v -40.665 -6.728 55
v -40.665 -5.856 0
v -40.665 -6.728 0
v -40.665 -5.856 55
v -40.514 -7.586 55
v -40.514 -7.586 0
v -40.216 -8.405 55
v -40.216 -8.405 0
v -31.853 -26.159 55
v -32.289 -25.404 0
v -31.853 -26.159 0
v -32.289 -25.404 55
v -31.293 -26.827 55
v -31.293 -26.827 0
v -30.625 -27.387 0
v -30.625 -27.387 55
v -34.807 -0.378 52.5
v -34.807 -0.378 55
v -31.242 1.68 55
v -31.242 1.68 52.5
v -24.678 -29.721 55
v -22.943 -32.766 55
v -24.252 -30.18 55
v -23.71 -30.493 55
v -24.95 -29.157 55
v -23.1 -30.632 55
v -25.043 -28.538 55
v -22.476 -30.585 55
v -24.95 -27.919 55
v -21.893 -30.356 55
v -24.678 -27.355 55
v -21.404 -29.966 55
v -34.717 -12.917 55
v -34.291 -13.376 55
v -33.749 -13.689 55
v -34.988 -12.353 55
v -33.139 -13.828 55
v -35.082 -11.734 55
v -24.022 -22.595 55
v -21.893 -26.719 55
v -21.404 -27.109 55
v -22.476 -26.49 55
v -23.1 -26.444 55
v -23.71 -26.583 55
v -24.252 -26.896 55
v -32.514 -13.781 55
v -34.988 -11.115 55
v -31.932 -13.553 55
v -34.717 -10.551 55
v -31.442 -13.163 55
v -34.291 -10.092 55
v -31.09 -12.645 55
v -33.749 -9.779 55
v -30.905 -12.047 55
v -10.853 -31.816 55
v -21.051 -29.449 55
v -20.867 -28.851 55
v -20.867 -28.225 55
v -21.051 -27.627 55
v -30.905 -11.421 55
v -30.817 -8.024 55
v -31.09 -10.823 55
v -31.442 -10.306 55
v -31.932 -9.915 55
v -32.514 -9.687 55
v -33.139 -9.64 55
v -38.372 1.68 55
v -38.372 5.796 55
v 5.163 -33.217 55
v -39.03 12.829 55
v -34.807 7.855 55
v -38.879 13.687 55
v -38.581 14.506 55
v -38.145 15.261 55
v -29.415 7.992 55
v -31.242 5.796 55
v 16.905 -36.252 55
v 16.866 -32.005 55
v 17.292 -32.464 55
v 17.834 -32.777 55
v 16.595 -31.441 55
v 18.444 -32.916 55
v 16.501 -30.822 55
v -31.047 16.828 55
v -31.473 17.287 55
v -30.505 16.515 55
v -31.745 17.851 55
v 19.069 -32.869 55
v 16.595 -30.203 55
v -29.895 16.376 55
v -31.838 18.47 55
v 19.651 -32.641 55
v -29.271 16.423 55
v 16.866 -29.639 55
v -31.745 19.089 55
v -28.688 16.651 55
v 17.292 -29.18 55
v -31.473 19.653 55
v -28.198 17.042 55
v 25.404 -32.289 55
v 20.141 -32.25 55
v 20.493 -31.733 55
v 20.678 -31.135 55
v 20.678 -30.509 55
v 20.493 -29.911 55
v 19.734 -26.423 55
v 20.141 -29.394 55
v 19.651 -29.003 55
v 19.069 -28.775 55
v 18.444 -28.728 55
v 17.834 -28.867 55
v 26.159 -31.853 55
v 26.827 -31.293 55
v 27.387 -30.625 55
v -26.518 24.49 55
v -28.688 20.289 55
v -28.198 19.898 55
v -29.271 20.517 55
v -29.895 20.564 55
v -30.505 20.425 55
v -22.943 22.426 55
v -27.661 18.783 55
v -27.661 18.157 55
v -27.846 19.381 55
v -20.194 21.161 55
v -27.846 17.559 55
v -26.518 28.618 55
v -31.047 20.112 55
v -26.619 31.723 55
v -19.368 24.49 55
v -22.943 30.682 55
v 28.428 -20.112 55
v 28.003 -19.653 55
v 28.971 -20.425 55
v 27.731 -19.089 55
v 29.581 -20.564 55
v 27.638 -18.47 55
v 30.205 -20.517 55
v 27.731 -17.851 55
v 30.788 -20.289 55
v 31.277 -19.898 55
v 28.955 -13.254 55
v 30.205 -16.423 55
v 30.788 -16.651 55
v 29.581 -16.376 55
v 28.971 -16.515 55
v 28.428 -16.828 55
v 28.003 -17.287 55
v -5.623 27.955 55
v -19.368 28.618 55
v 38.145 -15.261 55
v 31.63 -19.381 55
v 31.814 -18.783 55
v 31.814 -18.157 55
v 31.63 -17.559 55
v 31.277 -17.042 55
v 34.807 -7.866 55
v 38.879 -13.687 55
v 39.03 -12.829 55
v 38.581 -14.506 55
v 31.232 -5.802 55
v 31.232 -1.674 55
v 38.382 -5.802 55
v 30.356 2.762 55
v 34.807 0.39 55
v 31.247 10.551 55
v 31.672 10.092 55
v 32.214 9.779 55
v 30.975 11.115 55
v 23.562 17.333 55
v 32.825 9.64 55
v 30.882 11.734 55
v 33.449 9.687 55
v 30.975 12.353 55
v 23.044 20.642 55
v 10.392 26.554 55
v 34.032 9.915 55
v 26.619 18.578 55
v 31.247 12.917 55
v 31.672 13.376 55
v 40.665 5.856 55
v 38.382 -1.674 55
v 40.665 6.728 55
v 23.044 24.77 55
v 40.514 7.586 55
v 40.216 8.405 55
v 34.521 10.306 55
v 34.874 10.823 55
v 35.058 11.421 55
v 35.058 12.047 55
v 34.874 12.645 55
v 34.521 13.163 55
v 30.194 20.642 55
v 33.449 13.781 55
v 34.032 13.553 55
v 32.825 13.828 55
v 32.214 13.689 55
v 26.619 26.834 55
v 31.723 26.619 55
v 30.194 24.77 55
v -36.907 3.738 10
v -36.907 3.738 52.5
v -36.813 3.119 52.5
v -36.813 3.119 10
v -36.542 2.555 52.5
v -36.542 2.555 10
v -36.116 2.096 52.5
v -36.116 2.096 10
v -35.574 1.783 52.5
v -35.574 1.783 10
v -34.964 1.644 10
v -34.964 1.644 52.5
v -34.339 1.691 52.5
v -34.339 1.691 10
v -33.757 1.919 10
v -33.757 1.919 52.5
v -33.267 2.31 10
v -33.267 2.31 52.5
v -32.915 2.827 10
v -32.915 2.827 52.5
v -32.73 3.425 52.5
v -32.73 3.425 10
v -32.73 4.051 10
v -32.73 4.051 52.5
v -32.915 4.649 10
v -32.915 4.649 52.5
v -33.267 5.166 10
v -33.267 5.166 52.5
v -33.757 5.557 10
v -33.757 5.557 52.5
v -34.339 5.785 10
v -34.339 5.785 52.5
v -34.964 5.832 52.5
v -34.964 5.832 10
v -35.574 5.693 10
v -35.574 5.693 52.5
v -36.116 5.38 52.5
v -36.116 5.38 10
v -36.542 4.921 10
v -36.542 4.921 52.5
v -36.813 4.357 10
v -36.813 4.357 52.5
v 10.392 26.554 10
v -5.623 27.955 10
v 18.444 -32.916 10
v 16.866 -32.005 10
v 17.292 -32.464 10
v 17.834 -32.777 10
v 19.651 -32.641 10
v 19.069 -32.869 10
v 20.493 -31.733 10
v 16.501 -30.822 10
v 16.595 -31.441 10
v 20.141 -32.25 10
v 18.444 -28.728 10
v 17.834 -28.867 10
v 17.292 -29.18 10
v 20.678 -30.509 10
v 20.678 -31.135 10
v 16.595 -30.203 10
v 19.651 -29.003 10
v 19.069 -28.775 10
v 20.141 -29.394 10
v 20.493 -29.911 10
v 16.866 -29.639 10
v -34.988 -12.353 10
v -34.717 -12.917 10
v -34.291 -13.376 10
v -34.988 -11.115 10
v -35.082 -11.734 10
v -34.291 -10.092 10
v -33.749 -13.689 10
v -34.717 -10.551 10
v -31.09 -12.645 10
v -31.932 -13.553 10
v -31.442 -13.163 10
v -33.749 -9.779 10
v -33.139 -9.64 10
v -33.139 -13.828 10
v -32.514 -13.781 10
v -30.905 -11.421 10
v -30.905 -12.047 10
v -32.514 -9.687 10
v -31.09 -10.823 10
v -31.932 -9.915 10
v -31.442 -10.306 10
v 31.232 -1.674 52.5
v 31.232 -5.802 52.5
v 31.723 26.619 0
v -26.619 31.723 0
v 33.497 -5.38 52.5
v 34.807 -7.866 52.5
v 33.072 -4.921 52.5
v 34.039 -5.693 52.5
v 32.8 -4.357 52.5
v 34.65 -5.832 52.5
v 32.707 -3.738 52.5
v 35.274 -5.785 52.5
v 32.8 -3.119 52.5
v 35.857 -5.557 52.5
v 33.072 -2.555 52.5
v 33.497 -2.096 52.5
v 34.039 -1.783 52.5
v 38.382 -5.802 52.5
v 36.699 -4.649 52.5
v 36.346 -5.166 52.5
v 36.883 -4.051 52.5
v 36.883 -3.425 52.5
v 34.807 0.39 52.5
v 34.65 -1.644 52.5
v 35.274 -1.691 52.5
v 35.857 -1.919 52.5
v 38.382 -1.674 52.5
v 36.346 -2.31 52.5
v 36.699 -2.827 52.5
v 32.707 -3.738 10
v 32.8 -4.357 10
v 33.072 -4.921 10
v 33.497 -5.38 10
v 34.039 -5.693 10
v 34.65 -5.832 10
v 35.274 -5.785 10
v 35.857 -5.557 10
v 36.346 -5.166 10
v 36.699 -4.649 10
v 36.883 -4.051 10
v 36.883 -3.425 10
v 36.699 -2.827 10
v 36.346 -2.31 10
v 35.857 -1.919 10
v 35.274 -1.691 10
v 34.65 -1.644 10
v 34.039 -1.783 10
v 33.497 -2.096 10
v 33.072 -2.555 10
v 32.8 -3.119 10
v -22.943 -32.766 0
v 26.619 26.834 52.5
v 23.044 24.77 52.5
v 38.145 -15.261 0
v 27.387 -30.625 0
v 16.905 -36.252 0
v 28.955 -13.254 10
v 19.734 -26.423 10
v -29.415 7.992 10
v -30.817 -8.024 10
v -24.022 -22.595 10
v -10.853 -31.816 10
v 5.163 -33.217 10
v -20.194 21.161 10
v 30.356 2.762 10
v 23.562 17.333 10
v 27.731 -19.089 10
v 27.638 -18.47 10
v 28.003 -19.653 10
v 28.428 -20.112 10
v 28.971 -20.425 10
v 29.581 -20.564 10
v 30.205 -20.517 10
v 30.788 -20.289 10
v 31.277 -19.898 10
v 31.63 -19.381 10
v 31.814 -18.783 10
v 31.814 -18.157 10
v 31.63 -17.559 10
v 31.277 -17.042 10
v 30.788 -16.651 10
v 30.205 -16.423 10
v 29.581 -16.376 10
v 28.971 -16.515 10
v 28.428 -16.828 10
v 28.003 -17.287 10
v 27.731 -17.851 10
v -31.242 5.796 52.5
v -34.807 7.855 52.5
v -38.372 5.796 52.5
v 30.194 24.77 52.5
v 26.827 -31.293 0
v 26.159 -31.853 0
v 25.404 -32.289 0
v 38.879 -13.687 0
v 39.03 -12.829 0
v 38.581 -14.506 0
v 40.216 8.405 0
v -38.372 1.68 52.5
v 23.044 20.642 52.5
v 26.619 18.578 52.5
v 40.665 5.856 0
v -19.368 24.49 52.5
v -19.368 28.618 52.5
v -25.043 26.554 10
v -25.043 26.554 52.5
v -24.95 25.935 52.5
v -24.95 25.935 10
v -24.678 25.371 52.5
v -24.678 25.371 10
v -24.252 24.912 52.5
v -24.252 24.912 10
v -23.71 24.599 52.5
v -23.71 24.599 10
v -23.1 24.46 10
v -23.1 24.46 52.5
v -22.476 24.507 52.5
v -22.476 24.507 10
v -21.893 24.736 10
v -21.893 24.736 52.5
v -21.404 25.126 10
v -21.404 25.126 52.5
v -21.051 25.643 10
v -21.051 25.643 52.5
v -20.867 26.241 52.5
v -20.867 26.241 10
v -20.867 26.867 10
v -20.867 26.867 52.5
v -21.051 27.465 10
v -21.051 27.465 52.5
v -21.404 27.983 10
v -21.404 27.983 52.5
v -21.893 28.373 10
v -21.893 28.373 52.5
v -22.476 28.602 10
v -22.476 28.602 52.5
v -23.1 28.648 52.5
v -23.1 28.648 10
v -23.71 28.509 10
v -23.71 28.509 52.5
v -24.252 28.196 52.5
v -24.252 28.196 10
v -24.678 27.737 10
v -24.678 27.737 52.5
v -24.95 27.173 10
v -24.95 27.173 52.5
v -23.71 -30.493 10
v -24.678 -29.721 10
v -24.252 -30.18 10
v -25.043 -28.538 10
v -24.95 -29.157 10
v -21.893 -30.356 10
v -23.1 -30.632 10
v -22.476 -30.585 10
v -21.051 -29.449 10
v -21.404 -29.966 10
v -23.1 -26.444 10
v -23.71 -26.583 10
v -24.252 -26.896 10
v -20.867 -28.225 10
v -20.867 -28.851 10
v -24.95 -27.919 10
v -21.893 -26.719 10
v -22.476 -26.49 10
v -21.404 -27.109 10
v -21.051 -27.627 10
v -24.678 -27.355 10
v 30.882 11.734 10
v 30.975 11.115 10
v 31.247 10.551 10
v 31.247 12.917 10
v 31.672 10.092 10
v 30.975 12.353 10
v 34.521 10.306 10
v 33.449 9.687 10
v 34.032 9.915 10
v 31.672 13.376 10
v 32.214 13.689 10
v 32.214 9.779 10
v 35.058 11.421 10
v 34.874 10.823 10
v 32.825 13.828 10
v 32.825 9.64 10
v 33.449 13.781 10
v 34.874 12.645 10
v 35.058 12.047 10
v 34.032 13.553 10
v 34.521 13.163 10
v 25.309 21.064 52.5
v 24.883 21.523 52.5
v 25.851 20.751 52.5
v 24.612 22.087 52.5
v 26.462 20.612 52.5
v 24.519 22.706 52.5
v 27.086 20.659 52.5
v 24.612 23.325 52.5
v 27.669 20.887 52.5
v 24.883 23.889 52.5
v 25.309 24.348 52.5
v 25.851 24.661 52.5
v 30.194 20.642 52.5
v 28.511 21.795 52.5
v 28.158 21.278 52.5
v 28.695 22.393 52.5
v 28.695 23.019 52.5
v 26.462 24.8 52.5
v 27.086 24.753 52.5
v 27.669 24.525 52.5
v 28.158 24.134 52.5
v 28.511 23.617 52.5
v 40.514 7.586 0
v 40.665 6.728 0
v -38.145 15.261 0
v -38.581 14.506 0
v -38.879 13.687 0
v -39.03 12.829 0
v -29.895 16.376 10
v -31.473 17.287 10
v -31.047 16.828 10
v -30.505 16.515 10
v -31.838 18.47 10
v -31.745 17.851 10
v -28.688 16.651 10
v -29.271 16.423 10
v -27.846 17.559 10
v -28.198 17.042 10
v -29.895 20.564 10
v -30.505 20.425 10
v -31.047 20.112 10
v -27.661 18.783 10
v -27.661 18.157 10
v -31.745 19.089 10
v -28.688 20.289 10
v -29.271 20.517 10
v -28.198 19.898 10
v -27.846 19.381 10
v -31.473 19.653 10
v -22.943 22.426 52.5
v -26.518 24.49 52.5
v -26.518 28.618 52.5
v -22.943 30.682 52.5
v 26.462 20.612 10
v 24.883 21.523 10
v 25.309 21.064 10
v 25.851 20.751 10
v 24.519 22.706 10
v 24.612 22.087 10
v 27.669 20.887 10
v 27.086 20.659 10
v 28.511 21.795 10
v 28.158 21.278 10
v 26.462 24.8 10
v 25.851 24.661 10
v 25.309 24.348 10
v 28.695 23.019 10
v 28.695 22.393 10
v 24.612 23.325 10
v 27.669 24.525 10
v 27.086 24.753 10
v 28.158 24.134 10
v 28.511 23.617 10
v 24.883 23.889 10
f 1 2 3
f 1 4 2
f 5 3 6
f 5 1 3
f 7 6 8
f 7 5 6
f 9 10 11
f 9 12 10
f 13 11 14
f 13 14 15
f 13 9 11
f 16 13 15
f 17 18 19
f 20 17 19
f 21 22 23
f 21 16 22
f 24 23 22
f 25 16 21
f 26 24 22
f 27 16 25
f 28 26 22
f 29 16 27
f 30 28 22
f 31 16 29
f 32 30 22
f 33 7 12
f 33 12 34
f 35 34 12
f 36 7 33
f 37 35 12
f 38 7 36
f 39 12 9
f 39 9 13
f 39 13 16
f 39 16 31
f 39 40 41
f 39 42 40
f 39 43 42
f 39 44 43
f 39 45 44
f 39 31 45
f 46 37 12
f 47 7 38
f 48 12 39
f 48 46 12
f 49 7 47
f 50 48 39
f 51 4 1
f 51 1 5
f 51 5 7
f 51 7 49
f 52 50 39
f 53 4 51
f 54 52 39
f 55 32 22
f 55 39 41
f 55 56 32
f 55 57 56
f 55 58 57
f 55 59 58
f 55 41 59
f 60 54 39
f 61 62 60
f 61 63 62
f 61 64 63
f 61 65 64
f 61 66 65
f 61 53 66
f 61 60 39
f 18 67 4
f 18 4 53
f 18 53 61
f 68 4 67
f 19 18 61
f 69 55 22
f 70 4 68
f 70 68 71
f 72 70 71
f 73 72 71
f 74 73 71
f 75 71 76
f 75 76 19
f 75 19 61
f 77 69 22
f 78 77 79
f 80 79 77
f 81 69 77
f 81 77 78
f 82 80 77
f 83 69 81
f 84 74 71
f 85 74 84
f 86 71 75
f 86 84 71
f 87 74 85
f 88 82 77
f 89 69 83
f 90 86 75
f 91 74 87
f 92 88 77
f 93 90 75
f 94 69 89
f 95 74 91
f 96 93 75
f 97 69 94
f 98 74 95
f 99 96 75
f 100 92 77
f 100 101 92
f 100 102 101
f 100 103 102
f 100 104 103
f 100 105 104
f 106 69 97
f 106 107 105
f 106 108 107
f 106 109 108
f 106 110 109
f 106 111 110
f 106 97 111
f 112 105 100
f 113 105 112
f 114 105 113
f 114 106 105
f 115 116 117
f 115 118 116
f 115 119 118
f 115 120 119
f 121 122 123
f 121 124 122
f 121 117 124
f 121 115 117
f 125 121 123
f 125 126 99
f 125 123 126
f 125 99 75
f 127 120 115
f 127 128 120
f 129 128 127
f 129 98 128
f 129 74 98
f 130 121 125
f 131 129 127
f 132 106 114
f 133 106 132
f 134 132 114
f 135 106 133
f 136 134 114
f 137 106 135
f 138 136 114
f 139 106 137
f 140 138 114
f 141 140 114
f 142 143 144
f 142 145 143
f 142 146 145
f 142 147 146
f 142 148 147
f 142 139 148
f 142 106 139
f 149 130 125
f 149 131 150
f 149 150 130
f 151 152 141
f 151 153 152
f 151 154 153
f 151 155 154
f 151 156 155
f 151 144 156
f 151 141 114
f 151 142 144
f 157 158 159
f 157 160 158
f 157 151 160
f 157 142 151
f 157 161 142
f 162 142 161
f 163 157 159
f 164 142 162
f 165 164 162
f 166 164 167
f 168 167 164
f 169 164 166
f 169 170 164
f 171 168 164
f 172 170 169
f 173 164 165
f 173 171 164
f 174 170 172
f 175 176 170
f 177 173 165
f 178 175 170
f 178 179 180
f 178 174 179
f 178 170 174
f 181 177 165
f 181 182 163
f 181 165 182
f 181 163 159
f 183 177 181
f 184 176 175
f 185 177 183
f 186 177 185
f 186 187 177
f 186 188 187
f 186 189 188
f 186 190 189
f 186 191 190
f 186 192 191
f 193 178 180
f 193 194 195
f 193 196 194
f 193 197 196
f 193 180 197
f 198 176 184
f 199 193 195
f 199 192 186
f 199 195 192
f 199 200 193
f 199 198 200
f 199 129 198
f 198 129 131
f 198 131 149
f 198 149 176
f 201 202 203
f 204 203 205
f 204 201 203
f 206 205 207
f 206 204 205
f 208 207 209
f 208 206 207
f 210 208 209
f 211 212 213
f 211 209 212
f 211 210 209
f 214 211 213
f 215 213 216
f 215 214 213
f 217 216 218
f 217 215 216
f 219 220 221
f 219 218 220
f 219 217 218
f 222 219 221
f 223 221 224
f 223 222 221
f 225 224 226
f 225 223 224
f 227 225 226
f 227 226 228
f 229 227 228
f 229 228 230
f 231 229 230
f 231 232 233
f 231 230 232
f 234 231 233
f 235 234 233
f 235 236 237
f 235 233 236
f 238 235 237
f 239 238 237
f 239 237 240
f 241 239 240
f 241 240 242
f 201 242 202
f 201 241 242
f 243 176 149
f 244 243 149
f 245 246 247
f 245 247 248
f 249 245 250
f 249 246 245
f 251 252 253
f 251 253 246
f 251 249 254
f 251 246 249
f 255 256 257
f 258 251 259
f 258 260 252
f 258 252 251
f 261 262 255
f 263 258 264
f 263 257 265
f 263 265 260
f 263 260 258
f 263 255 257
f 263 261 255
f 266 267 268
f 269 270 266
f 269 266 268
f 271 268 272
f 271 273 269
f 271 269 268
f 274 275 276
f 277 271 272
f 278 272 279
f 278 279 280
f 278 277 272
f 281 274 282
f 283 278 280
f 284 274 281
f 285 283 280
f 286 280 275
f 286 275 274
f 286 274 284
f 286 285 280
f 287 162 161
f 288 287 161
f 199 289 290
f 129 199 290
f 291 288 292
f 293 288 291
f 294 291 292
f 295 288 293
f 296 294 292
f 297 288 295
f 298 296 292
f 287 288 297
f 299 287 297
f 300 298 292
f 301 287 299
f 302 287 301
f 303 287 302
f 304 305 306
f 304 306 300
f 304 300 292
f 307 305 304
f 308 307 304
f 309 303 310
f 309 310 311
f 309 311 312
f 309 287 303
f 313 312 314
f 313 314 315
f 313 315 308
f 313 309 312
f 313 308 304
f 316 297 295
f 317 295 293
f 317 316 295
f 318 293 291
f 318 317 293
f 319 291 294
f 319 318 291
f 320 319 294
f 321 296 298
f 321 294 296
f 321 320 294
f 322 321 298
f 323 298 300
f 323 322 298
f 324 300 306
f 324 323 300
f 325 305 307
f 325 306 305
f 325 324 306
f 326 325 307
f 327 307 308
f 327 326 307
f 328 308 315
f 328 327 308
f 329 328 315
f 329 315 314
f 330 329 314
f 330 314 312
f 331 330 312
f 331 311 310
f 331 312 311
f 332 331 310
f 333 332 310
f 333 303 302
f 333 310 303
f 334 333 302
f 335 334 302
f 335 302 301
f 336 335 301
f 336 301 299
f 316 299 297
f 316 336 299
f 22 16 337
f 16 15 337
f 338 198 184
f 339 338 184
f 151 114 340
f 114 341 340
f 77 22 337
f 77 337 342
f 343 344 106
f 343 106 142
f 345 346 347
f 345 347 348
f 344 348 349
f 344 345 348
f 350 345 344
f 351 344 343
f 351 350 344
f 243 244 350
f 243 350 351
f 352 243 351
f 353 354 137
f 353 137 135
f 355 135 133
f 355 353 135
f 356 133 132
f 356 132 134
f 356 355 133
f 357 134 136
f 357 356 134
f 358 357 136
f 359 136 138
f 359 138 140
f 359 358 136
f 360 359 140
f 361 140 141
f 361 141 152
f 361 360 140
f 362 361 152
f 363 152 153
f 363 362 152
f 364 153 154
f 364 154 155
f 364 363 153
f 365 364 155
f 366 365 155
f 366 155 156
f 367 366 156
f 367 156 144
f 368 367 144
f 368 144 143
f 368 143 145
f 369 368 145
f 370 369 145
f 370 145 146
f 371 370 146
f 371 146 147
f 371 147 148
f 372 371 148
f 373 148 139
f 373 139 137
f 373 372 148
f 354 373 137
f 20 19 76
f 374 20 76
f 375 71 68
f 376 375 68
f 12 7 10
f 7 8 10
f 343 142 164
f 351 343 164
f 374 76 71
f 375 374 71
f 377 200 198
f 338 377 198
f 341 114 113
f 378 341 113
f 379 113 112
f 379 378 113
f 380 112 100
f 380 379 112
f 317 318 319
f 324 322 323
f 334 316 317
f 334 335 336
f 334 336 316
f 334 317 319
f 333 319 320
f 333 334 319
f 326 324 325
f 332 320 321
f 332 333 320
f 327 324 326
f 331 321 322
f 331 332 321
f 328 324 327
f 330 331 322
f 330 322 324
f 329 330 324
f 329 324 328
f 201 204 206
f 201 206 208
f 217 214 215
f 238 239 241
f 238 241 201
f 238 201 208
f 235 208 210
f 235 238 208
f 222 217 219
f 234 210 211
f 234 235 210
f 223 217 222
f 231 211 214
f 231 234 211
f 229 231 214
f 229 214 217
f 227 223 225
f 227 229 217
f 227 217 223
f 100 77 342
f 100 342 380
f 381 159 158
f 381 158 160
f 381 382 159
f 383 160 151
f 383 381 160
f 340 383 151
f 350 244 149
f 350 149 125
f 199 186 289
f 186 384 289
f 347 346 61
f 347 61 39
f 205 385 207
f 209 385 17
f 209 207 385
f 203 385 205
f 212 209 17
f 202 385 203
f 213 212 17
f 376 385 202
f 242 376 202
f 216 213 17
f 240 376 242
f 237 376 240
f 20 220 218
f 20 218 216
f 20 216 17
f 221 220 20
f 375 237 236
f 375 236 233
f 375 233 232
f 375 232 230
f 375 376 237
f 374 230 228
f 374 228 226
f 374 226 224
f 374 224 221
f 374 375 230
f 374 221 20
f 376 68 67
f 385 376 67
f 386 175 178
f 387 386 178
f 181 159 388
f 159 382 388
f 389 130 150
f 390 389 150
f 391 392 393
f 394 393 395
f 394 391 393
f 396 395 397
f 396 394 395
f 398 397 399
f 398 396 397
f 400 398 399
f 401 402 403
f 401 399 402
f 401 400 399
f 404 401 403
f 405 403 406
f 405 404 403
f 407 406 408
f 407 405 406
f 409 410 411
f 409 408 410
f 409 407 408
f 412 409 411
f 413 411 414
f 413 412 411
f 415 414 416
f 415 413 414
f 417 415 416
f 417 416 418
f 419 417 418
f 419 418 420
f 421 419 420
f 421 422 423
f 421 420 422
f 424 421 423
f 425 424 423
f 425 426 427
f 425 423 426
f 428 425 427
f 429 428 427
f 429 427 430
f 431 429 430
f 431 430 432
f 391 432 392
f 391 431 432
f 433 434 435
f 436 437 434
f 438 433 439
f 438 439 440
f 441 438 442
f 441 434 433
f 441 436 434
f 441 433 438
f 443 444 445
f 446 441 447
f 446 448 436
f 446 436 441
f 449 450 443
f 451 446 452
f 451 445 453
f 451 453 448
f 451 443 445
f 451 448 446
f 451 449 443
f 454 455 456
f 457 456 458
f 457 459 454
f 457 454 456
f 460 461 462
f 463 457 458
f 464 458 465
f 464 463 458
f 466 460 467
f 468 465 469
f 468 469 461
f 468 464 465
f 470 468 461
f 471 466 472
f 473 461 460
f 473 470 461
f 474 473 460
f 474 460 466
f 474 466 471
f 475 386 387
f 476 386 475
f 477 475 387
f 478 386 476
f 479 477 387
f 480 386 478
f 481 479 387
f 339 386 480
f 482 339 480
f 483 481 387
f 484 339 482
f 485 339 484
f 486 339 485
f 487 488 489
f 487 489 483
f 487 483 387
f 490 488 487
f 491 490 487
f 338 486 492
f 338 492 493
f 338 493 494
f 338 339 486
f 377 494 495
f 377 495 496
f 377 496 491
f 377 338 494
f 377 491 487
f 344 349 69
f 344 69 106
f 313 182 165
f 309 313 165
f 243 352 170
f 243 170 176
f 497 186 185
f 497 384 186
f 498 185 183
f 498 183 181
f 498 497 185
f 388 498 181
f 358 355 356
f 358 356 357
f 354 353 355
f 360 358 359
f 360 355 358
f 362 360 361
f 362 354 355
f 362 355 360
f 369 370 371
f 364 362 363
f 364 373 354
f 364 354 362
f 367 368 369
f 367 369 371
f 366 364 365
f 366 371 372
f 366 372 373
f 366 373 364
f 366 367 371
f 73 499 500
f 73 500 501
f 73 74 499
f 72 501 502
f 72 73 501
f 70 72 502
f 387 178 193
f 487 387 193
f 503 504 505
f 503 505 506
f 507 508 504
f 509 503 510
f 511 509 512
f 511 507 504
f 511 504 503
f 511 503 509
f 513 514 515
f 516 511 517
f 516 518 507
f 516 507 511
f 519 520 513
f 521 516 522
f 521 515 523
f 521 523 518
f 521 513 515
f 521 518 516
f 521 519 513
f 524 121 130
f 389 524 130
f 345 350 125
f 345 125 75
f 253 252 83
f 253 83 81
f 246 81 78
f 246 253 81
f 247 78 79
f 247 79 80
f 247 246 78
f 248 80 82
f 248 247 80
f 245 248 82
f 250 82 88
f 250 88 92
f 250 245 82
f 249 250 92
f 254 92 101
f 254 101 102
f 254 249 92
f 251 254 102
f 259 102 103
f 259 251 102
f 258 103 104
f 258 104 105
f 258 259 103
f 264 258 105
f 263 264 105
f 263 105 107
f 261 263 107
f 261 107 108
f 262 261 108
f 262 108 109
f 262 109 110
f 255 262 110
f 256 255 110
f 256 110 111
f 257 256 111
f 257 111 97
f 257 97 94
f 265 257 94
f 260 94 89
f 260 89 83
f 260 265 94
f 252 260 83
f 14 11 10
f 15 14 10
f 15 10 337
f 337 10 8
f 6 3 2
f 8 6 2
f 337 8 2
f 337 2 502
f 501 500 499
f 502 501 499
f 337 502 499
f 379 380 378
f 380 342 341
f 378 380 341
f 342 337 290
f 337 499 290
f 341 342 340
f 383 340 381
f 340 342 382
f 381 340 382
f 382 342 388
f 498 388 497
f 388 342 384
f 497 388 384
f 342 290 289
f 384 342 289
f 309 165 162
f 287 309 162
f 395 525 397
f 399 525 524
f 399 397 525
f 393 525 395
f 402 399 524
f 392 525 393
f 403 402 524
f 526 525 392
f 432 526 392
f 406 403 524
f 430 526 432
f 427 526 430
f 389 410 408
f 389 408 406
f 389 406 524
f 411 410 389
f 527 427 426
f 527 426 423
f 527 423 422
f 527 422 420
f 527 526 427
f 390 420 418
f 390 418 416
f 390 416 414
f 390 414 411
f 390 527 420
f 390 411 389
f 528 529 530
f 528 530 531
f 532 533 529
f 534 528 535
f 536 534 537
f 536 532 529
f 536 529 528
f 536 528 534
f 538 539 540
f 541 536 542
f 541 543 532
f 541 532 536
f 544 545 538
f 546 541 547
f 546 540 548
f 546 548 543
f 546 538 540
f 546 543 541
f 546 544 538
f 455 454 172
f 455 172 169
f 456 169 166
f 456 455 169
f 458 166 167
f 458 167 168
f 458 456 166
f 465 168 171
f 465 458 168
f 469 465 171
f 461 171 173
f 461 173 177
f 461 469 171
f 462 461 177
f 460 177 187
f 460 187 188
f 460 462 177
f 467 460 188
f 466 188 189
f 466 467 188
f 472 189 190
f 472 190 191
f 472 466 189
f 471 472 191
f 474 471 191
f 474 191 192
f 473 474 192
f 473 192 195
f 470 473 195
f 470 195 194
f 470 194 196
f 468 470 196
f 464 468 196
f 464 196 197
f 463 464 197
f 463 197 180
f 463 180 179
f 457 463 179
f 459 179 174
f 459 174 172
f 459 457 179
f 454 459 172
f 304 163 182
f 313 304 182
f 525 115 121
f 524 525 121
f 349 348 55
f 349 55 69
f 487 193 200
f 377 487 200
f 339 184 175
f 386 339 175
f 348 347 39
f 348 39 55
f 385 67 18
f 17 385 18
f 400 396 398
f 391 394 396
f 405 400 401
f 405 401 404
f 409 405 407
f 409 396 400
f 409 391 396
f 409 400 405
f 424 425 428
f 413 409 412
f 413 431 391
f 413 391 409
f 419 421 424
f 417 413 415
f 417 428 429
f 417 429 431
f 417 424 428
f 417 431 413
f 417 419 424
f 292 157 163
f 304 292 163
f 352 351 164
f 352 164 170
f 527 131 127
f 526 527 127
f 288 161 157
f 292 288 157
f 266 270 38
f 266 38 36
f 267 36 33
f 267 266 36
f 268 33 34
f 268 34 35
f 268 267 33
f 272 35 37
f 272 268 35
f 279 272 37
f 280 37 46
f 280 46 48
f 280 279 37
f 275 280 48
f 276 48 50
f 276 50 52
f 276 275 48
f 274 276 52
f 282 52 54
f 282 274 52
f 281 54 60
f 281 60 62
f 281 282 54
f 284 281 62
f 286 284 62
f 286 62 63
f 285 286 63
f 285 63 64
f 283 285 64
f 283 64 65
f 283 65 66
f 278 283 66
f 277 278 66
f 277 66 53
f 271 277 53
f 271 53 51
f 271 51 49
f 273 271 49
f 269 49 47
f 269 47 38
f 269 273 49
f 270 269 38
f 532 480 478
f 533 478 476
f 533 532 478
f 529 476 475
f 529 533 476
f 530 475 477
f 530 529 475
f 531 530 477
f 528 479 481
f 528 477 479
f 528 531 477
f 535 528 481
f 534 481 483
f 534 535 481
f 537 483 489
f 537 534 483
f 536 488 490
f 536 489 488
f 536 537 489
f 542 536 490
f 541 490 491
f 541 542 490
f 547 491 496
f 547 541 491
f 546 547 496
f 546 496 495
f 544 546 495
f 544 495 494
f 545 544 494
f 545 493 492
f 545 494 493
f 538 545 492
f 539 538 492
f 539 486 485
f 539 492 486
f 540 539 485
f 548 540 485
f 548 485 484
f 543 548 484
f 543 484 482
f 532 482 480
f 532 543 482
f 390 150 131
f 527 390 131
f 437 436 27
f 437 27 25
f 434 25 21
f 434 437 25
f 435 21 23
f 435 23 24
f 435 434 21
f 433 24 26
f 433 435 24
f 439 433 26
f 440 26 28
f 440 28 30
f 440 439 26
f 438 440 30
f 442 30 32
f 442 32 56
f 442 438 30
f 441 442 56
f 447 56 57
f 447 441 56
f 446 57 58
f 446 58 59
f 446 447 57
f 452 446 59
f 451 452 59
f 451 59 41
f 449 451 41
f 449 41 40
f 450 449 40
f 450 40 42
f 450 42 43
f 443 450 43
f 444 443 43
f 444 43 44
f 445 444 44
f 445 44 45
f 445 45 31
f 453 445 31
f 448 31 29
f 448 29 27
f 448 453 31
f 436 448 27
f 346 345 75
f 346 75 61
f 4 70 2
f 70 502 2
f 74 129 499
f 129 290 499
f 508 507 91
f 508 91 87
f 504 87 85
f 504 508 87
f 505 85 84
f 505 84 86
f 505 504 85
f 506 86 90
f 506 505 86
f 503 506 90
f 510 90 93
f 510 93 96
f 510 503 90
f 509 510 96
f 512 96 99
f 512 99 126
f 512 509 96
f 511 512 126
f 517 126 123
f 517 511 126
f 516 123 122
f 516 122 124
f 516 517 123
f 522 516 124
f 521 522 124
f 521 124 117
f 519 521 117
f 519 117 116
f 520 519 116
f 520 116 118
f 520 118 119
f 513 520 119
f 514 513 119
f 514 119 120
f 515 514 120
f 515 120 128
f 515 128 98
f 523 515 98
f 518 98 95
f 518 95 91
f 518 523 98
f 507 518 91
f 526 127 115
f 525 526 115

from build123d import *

# Parameters (mm, degrees)
BOSS_EXTRU_1_DEPTH      = 10
ESQUISSE2_R             = 2.1
BOSS_EXTRU_2_DEPTH      = 45
ENL_V_MAT_EXTRU_1_DEPTH = 2.5
CONG_1_R                = 5


with BuildPart() as part:
    # Esquisse1 → Boss.-Extru.1 (new body)
    with BuildSketch(Plane.XY):
        Polygon((16.90473047, -36.252311481), (26.618508055, -31.722702604), (38.913655488, -14.163412304), (40.781920359, 7.190952884), (31.722702604, 26.618508055), (-26.618508055, 31.722702604), (-38.913655488, 14.163412304), (-40.781920359, -7.190952884), (-31.722702604, -26.618508055), (-22.943057454, -32.766081772), align=None)
    extrude(amount=BOSS_EXTRU_1_DEPTH)

    # Esquisse2 → Boss.-Extru.2 (add)
    with BuildSketch(Plane.XY.offset(10)):
        Polygon((31.722702604, 26.618508055), (-26.618508055, 31.722702604), (-38.913655488, 14.163412304), (-40.781920359, -7.190952884), (-31.722702604, -26.618508055), (-22.943057454, -32.766081772), (16.90473047, -36.252311481), (26.618508055, -31.722702604), (38.913655488, -14.163412304), (40.781920359, 7.190952884), align=None)
        with Locations(Location((34.806654387, -3.73808347, 0), (0, 0, 180))):
            Circle(ESQUISSE2_R, mode=Mode.SUBTRACT)
        with Locations(Location((29.737818366, -18.469938184, 0), (0, 0, 180))):
            Circle(ESQUISSE2_R, mode=Mode.SUBTRACT)
        with Locations(Location((-32.981605632, -11.73414452, 0), (0, 0, 180))):
            Circle(ESQUISSE2_R, mode=Mode.SUBTRACT)
        with Locations(Location((-34.806654387, 3.73808347, 0), (0, 0, 180))):
            Circle(ESQUISSE2_R, mode=Mode.SUBTRACT)
        with Locations(Location((-29.737818366, 18.469938184, 0), (0, 0, 180))):
            Circle(ESQUISSE2_R, mode=Mode.SUBTRACT)
        with Locations(Location((32.981605632, 11.73414452, 0), (0, 0, 180))):
            Circle(ESQUISSE2_R, mode=Mode.SUBTRACT)
        with Locations(Location((18.601253659, -30.822032576, 0), (0, 0, 180))):
            Circle(ESQUISSE2_R, mode=Mode.SUBTRACT)
        with Locations(Location((-22.943057454, -28.537832938, 0), (0, 0, 180))):
            Circle(ESQUISSE2_R, mode=Mode.SUBTRACT)
        with Locations(Location((26.618508055, 22.705871893, 0), (0, 0, 180))):
            Circle(ESQUISSE2_R, mode=Mode.SUBTRACT)
        with Locations(Location((-22.943057454, 26.554275329, 0), (0, 0, 180))):
            Circle(ESQUISSE2_R, mode=Mode.SUBTRACT)
        Polygon((-20.194060765, 21.161060665), (-29.41542134, 7.991592941), (-30.816619994, -8.024180951), (-24.022206677, -22.594847329), (-10.852738952, -31.816207904), (5.163034939, -33.217406557), (19.733701317, -26.42299324), (28.955061892, -13.253525516), (30.356260545, 2.762248376), (23.561847229, 17.332914754), (10.392379504, 26.554275329), (-5.623394388, 27.955473982), align=None, mode=Mode.SUBTRACT)
    extrude(amount=BOSS_EXTRU_2_DEPTH)

    # Esquisse3 → Enlèv. mat.-Extru.1 (cut)
    with BuildSketch(Plane.XY.offset(55)):
        Polygon((-34.806654387, -0.37842395), (-31.241654387, 1.67982976), (-31.241654387, 5.796337179), (-34.806654387, 7.854590889), (-38.371654387, 5.796337179), (-38.371654387, 1.67982976), align=None)
        Polygon((-22.943057454, 22.426220904), (-19.368057454, 24.490248116), (-19.368057454, 28.618302541), (-22.943057454, 30.682329753), (-26.518057454, 28.618302541), (-26.518057454, 24.490248116), align=None)
        Polygon((30.193508055, 20.641844681), (30.193508055, 24.769899106), (26.618508055, 26.833926318), (23.043508055, 24.769899106), (23.043508055, 20.641844681), (26.618508055, 18.577817469), align=None)
        Polygon((38.381654387, -5.802110682), (38.381654387, -1.674056257), (34.806654387, 0.389970955), (31.231654387, -1.674056257), (31.231654387, -5.802110682), (34.806654387, -7.866137894), align=None)
    extrude(amount=-ENL_V_MAT_EXTRU_1_DEPTH, mode=Mode.SUBTRACT)

    # Congé1
    cong_1_edges = [part.edges().sort_by_distance(p)[0] for p in [
        (40.781920359, 7.190952884, 27.5),
        (38.913655488, -14.163412304, 27.5),
        (26.618508055, -31.722702604, 27.5),
        (-31.722702604, -26.618508055, 27.5),
        (-40.781920359, -7.190952884, 27.5),
        (-38.913655488, 14.163412304, 27.5),
    ]]
    fillet(cong_1_edges, radius=CONG_1_R)


solid = part.part
